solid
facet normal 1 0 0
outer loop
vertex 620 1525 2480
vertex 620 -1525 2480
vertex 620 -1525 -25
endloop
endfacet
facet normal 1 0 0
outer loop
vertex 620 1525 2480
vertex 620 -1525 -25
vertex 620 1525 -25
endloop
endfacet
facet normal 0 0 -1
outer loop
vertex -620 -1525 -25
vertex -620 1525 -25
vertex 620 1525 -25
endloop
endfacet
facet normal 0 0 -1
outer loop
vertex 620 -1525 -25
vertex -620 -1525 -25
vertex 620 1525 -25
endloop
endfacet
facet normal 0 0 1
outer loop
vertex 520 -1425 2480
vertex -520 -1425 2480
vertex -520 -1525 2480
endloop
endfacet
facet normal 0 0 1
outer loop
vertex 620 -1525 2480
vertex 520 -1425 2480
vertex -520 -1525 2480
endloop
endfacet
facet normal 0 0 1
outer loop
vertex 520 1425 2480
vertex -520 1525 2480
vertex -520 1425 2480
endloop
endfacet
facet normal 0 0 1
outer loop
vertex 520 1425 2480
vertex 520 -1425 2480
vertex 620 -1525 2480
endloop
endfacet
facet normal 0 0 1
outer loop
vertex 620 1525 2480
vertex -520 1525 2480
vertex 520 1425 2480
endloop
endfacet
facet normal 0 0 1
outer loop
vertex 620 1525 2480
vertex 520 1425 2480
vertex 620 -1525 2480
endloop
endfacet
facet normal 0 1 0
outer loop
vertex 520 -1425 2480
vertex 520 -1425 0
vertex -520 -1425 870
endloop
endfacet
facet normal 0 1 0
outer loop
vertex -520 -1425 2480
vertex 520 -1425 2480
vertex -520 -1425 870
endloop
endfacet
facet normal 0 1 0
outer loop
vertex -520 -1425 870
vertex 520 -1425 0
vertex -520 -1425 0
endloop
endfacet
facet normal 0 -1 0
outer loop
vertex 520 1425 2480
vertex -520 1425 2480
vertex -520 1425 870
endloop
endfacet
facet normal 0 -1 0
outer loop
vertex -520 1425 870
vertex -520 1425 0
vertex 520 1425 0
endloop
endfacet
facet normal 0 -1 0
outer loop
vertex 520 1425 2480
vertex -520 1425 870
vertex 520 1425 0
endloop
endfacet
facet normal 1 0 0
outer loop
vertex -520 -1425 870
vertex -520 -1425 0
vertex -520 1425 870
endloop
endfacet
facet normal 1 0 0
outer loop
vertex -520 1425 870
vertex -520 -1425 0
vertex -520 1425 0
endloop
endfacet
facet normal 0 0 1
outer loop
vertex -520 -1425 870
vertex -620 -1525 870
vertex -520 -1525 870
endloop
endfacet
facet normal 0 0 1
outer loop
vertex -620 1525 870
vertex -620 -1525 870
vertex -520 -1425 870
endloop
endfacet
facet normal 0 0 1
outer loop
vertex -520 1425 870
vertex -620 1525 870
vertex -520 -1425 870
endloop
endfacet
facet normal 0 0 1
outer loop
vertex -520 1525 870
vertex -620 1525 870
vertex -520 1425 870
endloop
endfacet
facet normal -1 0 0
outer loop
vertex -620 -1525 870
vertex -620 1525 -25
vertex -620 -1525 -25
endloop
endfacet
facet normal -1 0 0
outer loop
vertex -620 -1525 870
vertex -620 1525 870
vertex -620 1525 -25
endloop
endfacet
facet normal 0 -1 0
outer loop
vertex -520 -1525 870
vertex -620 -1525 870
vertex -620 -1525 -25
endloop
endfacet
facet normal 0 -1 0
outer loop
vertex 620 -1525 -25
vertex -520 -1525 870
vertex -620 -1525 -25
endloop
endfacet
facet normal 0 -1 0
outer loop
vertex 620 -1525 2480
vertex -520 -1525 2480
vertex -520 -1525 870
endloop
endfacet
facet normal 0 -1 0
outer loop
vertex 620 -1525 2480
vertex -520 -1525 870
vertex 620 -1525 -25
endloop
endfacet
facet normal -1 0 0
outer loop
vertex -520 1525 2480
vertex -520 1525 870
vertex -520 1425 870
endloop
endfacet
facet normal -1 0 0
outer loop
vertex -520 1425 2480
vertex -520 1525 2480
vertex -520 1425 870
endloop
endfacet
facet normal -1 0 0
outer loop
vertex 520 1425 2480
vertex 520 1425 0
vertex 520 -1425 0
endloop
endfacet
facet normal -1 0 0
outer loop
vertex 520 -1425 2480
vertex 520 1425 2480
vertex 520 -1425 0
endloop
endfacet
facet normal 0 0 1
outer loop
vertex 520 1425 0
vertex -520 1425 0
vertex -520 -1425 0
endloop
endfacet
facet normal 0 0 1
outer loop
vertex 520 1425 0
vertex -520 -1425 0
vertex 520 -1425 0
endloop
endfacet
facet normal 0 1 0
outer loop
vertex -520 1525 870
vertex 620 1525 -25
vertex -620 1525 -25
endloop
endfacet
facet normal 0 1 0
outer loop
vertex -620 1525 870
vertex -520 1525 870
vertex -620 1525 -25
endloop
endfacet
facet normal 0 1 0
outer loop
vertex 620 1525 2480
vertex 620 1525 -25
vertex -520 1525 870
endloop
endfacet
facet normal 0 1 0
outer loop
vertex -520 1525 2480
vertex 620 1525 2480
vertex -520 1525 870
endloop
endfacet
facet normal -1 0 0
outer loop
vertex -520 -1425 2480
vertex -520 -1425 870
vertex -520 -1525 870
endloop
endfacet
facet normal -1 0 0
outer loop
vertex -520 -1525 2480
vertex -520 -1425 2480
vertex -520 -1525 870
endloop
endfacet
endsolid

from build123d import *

# Parameters (mm, degrees)
F1_DEPTH = 870
F2_DEPTH = 2480
F0_W     = 1040
F0_H     = 2850
F3_DEPTH = 25


with BuildPart() as f1:
    # F0 (on Top) → F1 (new body)
    with BuildSketch(Plane.XY):
        Polygon((-520, -1525), (-520, -1425), (-520, 1425), (-520, 1525), (-620, 1525), (-620, -1525), align=None)
    extrude(amount=F1_DEPTH)

    # F0 (on Top) → F2 (join)
    with BuildSketch(Plane.XY):
        Polygon((520, 1425), (520, -1425), (-520, -1425), (-520, -1525), (620, -1525), (620, 1525), (-520, 1525), (-520, 1425), align=None)
    extrude(amount=F2_DEPTH)

    # F0 (on Top) → F3 (join)
    with BuildSketch(Plane.XY):
        Rectangle(F0_W, F0_H)
        Polygon((-520, -1525), (-520, -1425), (-520, 1425), (-520, 1525), (-620, 1525), (-620, -1525), align=None)
        Polygon((520, 1425), (520, -1425), (-520, -1425), (-520, -1525), (620, -1525), (620, 1525), (-520, 1525), (-520, 1425), align=None)
    extrude(amount=-F3_DEPTH)


solid = f1.part
